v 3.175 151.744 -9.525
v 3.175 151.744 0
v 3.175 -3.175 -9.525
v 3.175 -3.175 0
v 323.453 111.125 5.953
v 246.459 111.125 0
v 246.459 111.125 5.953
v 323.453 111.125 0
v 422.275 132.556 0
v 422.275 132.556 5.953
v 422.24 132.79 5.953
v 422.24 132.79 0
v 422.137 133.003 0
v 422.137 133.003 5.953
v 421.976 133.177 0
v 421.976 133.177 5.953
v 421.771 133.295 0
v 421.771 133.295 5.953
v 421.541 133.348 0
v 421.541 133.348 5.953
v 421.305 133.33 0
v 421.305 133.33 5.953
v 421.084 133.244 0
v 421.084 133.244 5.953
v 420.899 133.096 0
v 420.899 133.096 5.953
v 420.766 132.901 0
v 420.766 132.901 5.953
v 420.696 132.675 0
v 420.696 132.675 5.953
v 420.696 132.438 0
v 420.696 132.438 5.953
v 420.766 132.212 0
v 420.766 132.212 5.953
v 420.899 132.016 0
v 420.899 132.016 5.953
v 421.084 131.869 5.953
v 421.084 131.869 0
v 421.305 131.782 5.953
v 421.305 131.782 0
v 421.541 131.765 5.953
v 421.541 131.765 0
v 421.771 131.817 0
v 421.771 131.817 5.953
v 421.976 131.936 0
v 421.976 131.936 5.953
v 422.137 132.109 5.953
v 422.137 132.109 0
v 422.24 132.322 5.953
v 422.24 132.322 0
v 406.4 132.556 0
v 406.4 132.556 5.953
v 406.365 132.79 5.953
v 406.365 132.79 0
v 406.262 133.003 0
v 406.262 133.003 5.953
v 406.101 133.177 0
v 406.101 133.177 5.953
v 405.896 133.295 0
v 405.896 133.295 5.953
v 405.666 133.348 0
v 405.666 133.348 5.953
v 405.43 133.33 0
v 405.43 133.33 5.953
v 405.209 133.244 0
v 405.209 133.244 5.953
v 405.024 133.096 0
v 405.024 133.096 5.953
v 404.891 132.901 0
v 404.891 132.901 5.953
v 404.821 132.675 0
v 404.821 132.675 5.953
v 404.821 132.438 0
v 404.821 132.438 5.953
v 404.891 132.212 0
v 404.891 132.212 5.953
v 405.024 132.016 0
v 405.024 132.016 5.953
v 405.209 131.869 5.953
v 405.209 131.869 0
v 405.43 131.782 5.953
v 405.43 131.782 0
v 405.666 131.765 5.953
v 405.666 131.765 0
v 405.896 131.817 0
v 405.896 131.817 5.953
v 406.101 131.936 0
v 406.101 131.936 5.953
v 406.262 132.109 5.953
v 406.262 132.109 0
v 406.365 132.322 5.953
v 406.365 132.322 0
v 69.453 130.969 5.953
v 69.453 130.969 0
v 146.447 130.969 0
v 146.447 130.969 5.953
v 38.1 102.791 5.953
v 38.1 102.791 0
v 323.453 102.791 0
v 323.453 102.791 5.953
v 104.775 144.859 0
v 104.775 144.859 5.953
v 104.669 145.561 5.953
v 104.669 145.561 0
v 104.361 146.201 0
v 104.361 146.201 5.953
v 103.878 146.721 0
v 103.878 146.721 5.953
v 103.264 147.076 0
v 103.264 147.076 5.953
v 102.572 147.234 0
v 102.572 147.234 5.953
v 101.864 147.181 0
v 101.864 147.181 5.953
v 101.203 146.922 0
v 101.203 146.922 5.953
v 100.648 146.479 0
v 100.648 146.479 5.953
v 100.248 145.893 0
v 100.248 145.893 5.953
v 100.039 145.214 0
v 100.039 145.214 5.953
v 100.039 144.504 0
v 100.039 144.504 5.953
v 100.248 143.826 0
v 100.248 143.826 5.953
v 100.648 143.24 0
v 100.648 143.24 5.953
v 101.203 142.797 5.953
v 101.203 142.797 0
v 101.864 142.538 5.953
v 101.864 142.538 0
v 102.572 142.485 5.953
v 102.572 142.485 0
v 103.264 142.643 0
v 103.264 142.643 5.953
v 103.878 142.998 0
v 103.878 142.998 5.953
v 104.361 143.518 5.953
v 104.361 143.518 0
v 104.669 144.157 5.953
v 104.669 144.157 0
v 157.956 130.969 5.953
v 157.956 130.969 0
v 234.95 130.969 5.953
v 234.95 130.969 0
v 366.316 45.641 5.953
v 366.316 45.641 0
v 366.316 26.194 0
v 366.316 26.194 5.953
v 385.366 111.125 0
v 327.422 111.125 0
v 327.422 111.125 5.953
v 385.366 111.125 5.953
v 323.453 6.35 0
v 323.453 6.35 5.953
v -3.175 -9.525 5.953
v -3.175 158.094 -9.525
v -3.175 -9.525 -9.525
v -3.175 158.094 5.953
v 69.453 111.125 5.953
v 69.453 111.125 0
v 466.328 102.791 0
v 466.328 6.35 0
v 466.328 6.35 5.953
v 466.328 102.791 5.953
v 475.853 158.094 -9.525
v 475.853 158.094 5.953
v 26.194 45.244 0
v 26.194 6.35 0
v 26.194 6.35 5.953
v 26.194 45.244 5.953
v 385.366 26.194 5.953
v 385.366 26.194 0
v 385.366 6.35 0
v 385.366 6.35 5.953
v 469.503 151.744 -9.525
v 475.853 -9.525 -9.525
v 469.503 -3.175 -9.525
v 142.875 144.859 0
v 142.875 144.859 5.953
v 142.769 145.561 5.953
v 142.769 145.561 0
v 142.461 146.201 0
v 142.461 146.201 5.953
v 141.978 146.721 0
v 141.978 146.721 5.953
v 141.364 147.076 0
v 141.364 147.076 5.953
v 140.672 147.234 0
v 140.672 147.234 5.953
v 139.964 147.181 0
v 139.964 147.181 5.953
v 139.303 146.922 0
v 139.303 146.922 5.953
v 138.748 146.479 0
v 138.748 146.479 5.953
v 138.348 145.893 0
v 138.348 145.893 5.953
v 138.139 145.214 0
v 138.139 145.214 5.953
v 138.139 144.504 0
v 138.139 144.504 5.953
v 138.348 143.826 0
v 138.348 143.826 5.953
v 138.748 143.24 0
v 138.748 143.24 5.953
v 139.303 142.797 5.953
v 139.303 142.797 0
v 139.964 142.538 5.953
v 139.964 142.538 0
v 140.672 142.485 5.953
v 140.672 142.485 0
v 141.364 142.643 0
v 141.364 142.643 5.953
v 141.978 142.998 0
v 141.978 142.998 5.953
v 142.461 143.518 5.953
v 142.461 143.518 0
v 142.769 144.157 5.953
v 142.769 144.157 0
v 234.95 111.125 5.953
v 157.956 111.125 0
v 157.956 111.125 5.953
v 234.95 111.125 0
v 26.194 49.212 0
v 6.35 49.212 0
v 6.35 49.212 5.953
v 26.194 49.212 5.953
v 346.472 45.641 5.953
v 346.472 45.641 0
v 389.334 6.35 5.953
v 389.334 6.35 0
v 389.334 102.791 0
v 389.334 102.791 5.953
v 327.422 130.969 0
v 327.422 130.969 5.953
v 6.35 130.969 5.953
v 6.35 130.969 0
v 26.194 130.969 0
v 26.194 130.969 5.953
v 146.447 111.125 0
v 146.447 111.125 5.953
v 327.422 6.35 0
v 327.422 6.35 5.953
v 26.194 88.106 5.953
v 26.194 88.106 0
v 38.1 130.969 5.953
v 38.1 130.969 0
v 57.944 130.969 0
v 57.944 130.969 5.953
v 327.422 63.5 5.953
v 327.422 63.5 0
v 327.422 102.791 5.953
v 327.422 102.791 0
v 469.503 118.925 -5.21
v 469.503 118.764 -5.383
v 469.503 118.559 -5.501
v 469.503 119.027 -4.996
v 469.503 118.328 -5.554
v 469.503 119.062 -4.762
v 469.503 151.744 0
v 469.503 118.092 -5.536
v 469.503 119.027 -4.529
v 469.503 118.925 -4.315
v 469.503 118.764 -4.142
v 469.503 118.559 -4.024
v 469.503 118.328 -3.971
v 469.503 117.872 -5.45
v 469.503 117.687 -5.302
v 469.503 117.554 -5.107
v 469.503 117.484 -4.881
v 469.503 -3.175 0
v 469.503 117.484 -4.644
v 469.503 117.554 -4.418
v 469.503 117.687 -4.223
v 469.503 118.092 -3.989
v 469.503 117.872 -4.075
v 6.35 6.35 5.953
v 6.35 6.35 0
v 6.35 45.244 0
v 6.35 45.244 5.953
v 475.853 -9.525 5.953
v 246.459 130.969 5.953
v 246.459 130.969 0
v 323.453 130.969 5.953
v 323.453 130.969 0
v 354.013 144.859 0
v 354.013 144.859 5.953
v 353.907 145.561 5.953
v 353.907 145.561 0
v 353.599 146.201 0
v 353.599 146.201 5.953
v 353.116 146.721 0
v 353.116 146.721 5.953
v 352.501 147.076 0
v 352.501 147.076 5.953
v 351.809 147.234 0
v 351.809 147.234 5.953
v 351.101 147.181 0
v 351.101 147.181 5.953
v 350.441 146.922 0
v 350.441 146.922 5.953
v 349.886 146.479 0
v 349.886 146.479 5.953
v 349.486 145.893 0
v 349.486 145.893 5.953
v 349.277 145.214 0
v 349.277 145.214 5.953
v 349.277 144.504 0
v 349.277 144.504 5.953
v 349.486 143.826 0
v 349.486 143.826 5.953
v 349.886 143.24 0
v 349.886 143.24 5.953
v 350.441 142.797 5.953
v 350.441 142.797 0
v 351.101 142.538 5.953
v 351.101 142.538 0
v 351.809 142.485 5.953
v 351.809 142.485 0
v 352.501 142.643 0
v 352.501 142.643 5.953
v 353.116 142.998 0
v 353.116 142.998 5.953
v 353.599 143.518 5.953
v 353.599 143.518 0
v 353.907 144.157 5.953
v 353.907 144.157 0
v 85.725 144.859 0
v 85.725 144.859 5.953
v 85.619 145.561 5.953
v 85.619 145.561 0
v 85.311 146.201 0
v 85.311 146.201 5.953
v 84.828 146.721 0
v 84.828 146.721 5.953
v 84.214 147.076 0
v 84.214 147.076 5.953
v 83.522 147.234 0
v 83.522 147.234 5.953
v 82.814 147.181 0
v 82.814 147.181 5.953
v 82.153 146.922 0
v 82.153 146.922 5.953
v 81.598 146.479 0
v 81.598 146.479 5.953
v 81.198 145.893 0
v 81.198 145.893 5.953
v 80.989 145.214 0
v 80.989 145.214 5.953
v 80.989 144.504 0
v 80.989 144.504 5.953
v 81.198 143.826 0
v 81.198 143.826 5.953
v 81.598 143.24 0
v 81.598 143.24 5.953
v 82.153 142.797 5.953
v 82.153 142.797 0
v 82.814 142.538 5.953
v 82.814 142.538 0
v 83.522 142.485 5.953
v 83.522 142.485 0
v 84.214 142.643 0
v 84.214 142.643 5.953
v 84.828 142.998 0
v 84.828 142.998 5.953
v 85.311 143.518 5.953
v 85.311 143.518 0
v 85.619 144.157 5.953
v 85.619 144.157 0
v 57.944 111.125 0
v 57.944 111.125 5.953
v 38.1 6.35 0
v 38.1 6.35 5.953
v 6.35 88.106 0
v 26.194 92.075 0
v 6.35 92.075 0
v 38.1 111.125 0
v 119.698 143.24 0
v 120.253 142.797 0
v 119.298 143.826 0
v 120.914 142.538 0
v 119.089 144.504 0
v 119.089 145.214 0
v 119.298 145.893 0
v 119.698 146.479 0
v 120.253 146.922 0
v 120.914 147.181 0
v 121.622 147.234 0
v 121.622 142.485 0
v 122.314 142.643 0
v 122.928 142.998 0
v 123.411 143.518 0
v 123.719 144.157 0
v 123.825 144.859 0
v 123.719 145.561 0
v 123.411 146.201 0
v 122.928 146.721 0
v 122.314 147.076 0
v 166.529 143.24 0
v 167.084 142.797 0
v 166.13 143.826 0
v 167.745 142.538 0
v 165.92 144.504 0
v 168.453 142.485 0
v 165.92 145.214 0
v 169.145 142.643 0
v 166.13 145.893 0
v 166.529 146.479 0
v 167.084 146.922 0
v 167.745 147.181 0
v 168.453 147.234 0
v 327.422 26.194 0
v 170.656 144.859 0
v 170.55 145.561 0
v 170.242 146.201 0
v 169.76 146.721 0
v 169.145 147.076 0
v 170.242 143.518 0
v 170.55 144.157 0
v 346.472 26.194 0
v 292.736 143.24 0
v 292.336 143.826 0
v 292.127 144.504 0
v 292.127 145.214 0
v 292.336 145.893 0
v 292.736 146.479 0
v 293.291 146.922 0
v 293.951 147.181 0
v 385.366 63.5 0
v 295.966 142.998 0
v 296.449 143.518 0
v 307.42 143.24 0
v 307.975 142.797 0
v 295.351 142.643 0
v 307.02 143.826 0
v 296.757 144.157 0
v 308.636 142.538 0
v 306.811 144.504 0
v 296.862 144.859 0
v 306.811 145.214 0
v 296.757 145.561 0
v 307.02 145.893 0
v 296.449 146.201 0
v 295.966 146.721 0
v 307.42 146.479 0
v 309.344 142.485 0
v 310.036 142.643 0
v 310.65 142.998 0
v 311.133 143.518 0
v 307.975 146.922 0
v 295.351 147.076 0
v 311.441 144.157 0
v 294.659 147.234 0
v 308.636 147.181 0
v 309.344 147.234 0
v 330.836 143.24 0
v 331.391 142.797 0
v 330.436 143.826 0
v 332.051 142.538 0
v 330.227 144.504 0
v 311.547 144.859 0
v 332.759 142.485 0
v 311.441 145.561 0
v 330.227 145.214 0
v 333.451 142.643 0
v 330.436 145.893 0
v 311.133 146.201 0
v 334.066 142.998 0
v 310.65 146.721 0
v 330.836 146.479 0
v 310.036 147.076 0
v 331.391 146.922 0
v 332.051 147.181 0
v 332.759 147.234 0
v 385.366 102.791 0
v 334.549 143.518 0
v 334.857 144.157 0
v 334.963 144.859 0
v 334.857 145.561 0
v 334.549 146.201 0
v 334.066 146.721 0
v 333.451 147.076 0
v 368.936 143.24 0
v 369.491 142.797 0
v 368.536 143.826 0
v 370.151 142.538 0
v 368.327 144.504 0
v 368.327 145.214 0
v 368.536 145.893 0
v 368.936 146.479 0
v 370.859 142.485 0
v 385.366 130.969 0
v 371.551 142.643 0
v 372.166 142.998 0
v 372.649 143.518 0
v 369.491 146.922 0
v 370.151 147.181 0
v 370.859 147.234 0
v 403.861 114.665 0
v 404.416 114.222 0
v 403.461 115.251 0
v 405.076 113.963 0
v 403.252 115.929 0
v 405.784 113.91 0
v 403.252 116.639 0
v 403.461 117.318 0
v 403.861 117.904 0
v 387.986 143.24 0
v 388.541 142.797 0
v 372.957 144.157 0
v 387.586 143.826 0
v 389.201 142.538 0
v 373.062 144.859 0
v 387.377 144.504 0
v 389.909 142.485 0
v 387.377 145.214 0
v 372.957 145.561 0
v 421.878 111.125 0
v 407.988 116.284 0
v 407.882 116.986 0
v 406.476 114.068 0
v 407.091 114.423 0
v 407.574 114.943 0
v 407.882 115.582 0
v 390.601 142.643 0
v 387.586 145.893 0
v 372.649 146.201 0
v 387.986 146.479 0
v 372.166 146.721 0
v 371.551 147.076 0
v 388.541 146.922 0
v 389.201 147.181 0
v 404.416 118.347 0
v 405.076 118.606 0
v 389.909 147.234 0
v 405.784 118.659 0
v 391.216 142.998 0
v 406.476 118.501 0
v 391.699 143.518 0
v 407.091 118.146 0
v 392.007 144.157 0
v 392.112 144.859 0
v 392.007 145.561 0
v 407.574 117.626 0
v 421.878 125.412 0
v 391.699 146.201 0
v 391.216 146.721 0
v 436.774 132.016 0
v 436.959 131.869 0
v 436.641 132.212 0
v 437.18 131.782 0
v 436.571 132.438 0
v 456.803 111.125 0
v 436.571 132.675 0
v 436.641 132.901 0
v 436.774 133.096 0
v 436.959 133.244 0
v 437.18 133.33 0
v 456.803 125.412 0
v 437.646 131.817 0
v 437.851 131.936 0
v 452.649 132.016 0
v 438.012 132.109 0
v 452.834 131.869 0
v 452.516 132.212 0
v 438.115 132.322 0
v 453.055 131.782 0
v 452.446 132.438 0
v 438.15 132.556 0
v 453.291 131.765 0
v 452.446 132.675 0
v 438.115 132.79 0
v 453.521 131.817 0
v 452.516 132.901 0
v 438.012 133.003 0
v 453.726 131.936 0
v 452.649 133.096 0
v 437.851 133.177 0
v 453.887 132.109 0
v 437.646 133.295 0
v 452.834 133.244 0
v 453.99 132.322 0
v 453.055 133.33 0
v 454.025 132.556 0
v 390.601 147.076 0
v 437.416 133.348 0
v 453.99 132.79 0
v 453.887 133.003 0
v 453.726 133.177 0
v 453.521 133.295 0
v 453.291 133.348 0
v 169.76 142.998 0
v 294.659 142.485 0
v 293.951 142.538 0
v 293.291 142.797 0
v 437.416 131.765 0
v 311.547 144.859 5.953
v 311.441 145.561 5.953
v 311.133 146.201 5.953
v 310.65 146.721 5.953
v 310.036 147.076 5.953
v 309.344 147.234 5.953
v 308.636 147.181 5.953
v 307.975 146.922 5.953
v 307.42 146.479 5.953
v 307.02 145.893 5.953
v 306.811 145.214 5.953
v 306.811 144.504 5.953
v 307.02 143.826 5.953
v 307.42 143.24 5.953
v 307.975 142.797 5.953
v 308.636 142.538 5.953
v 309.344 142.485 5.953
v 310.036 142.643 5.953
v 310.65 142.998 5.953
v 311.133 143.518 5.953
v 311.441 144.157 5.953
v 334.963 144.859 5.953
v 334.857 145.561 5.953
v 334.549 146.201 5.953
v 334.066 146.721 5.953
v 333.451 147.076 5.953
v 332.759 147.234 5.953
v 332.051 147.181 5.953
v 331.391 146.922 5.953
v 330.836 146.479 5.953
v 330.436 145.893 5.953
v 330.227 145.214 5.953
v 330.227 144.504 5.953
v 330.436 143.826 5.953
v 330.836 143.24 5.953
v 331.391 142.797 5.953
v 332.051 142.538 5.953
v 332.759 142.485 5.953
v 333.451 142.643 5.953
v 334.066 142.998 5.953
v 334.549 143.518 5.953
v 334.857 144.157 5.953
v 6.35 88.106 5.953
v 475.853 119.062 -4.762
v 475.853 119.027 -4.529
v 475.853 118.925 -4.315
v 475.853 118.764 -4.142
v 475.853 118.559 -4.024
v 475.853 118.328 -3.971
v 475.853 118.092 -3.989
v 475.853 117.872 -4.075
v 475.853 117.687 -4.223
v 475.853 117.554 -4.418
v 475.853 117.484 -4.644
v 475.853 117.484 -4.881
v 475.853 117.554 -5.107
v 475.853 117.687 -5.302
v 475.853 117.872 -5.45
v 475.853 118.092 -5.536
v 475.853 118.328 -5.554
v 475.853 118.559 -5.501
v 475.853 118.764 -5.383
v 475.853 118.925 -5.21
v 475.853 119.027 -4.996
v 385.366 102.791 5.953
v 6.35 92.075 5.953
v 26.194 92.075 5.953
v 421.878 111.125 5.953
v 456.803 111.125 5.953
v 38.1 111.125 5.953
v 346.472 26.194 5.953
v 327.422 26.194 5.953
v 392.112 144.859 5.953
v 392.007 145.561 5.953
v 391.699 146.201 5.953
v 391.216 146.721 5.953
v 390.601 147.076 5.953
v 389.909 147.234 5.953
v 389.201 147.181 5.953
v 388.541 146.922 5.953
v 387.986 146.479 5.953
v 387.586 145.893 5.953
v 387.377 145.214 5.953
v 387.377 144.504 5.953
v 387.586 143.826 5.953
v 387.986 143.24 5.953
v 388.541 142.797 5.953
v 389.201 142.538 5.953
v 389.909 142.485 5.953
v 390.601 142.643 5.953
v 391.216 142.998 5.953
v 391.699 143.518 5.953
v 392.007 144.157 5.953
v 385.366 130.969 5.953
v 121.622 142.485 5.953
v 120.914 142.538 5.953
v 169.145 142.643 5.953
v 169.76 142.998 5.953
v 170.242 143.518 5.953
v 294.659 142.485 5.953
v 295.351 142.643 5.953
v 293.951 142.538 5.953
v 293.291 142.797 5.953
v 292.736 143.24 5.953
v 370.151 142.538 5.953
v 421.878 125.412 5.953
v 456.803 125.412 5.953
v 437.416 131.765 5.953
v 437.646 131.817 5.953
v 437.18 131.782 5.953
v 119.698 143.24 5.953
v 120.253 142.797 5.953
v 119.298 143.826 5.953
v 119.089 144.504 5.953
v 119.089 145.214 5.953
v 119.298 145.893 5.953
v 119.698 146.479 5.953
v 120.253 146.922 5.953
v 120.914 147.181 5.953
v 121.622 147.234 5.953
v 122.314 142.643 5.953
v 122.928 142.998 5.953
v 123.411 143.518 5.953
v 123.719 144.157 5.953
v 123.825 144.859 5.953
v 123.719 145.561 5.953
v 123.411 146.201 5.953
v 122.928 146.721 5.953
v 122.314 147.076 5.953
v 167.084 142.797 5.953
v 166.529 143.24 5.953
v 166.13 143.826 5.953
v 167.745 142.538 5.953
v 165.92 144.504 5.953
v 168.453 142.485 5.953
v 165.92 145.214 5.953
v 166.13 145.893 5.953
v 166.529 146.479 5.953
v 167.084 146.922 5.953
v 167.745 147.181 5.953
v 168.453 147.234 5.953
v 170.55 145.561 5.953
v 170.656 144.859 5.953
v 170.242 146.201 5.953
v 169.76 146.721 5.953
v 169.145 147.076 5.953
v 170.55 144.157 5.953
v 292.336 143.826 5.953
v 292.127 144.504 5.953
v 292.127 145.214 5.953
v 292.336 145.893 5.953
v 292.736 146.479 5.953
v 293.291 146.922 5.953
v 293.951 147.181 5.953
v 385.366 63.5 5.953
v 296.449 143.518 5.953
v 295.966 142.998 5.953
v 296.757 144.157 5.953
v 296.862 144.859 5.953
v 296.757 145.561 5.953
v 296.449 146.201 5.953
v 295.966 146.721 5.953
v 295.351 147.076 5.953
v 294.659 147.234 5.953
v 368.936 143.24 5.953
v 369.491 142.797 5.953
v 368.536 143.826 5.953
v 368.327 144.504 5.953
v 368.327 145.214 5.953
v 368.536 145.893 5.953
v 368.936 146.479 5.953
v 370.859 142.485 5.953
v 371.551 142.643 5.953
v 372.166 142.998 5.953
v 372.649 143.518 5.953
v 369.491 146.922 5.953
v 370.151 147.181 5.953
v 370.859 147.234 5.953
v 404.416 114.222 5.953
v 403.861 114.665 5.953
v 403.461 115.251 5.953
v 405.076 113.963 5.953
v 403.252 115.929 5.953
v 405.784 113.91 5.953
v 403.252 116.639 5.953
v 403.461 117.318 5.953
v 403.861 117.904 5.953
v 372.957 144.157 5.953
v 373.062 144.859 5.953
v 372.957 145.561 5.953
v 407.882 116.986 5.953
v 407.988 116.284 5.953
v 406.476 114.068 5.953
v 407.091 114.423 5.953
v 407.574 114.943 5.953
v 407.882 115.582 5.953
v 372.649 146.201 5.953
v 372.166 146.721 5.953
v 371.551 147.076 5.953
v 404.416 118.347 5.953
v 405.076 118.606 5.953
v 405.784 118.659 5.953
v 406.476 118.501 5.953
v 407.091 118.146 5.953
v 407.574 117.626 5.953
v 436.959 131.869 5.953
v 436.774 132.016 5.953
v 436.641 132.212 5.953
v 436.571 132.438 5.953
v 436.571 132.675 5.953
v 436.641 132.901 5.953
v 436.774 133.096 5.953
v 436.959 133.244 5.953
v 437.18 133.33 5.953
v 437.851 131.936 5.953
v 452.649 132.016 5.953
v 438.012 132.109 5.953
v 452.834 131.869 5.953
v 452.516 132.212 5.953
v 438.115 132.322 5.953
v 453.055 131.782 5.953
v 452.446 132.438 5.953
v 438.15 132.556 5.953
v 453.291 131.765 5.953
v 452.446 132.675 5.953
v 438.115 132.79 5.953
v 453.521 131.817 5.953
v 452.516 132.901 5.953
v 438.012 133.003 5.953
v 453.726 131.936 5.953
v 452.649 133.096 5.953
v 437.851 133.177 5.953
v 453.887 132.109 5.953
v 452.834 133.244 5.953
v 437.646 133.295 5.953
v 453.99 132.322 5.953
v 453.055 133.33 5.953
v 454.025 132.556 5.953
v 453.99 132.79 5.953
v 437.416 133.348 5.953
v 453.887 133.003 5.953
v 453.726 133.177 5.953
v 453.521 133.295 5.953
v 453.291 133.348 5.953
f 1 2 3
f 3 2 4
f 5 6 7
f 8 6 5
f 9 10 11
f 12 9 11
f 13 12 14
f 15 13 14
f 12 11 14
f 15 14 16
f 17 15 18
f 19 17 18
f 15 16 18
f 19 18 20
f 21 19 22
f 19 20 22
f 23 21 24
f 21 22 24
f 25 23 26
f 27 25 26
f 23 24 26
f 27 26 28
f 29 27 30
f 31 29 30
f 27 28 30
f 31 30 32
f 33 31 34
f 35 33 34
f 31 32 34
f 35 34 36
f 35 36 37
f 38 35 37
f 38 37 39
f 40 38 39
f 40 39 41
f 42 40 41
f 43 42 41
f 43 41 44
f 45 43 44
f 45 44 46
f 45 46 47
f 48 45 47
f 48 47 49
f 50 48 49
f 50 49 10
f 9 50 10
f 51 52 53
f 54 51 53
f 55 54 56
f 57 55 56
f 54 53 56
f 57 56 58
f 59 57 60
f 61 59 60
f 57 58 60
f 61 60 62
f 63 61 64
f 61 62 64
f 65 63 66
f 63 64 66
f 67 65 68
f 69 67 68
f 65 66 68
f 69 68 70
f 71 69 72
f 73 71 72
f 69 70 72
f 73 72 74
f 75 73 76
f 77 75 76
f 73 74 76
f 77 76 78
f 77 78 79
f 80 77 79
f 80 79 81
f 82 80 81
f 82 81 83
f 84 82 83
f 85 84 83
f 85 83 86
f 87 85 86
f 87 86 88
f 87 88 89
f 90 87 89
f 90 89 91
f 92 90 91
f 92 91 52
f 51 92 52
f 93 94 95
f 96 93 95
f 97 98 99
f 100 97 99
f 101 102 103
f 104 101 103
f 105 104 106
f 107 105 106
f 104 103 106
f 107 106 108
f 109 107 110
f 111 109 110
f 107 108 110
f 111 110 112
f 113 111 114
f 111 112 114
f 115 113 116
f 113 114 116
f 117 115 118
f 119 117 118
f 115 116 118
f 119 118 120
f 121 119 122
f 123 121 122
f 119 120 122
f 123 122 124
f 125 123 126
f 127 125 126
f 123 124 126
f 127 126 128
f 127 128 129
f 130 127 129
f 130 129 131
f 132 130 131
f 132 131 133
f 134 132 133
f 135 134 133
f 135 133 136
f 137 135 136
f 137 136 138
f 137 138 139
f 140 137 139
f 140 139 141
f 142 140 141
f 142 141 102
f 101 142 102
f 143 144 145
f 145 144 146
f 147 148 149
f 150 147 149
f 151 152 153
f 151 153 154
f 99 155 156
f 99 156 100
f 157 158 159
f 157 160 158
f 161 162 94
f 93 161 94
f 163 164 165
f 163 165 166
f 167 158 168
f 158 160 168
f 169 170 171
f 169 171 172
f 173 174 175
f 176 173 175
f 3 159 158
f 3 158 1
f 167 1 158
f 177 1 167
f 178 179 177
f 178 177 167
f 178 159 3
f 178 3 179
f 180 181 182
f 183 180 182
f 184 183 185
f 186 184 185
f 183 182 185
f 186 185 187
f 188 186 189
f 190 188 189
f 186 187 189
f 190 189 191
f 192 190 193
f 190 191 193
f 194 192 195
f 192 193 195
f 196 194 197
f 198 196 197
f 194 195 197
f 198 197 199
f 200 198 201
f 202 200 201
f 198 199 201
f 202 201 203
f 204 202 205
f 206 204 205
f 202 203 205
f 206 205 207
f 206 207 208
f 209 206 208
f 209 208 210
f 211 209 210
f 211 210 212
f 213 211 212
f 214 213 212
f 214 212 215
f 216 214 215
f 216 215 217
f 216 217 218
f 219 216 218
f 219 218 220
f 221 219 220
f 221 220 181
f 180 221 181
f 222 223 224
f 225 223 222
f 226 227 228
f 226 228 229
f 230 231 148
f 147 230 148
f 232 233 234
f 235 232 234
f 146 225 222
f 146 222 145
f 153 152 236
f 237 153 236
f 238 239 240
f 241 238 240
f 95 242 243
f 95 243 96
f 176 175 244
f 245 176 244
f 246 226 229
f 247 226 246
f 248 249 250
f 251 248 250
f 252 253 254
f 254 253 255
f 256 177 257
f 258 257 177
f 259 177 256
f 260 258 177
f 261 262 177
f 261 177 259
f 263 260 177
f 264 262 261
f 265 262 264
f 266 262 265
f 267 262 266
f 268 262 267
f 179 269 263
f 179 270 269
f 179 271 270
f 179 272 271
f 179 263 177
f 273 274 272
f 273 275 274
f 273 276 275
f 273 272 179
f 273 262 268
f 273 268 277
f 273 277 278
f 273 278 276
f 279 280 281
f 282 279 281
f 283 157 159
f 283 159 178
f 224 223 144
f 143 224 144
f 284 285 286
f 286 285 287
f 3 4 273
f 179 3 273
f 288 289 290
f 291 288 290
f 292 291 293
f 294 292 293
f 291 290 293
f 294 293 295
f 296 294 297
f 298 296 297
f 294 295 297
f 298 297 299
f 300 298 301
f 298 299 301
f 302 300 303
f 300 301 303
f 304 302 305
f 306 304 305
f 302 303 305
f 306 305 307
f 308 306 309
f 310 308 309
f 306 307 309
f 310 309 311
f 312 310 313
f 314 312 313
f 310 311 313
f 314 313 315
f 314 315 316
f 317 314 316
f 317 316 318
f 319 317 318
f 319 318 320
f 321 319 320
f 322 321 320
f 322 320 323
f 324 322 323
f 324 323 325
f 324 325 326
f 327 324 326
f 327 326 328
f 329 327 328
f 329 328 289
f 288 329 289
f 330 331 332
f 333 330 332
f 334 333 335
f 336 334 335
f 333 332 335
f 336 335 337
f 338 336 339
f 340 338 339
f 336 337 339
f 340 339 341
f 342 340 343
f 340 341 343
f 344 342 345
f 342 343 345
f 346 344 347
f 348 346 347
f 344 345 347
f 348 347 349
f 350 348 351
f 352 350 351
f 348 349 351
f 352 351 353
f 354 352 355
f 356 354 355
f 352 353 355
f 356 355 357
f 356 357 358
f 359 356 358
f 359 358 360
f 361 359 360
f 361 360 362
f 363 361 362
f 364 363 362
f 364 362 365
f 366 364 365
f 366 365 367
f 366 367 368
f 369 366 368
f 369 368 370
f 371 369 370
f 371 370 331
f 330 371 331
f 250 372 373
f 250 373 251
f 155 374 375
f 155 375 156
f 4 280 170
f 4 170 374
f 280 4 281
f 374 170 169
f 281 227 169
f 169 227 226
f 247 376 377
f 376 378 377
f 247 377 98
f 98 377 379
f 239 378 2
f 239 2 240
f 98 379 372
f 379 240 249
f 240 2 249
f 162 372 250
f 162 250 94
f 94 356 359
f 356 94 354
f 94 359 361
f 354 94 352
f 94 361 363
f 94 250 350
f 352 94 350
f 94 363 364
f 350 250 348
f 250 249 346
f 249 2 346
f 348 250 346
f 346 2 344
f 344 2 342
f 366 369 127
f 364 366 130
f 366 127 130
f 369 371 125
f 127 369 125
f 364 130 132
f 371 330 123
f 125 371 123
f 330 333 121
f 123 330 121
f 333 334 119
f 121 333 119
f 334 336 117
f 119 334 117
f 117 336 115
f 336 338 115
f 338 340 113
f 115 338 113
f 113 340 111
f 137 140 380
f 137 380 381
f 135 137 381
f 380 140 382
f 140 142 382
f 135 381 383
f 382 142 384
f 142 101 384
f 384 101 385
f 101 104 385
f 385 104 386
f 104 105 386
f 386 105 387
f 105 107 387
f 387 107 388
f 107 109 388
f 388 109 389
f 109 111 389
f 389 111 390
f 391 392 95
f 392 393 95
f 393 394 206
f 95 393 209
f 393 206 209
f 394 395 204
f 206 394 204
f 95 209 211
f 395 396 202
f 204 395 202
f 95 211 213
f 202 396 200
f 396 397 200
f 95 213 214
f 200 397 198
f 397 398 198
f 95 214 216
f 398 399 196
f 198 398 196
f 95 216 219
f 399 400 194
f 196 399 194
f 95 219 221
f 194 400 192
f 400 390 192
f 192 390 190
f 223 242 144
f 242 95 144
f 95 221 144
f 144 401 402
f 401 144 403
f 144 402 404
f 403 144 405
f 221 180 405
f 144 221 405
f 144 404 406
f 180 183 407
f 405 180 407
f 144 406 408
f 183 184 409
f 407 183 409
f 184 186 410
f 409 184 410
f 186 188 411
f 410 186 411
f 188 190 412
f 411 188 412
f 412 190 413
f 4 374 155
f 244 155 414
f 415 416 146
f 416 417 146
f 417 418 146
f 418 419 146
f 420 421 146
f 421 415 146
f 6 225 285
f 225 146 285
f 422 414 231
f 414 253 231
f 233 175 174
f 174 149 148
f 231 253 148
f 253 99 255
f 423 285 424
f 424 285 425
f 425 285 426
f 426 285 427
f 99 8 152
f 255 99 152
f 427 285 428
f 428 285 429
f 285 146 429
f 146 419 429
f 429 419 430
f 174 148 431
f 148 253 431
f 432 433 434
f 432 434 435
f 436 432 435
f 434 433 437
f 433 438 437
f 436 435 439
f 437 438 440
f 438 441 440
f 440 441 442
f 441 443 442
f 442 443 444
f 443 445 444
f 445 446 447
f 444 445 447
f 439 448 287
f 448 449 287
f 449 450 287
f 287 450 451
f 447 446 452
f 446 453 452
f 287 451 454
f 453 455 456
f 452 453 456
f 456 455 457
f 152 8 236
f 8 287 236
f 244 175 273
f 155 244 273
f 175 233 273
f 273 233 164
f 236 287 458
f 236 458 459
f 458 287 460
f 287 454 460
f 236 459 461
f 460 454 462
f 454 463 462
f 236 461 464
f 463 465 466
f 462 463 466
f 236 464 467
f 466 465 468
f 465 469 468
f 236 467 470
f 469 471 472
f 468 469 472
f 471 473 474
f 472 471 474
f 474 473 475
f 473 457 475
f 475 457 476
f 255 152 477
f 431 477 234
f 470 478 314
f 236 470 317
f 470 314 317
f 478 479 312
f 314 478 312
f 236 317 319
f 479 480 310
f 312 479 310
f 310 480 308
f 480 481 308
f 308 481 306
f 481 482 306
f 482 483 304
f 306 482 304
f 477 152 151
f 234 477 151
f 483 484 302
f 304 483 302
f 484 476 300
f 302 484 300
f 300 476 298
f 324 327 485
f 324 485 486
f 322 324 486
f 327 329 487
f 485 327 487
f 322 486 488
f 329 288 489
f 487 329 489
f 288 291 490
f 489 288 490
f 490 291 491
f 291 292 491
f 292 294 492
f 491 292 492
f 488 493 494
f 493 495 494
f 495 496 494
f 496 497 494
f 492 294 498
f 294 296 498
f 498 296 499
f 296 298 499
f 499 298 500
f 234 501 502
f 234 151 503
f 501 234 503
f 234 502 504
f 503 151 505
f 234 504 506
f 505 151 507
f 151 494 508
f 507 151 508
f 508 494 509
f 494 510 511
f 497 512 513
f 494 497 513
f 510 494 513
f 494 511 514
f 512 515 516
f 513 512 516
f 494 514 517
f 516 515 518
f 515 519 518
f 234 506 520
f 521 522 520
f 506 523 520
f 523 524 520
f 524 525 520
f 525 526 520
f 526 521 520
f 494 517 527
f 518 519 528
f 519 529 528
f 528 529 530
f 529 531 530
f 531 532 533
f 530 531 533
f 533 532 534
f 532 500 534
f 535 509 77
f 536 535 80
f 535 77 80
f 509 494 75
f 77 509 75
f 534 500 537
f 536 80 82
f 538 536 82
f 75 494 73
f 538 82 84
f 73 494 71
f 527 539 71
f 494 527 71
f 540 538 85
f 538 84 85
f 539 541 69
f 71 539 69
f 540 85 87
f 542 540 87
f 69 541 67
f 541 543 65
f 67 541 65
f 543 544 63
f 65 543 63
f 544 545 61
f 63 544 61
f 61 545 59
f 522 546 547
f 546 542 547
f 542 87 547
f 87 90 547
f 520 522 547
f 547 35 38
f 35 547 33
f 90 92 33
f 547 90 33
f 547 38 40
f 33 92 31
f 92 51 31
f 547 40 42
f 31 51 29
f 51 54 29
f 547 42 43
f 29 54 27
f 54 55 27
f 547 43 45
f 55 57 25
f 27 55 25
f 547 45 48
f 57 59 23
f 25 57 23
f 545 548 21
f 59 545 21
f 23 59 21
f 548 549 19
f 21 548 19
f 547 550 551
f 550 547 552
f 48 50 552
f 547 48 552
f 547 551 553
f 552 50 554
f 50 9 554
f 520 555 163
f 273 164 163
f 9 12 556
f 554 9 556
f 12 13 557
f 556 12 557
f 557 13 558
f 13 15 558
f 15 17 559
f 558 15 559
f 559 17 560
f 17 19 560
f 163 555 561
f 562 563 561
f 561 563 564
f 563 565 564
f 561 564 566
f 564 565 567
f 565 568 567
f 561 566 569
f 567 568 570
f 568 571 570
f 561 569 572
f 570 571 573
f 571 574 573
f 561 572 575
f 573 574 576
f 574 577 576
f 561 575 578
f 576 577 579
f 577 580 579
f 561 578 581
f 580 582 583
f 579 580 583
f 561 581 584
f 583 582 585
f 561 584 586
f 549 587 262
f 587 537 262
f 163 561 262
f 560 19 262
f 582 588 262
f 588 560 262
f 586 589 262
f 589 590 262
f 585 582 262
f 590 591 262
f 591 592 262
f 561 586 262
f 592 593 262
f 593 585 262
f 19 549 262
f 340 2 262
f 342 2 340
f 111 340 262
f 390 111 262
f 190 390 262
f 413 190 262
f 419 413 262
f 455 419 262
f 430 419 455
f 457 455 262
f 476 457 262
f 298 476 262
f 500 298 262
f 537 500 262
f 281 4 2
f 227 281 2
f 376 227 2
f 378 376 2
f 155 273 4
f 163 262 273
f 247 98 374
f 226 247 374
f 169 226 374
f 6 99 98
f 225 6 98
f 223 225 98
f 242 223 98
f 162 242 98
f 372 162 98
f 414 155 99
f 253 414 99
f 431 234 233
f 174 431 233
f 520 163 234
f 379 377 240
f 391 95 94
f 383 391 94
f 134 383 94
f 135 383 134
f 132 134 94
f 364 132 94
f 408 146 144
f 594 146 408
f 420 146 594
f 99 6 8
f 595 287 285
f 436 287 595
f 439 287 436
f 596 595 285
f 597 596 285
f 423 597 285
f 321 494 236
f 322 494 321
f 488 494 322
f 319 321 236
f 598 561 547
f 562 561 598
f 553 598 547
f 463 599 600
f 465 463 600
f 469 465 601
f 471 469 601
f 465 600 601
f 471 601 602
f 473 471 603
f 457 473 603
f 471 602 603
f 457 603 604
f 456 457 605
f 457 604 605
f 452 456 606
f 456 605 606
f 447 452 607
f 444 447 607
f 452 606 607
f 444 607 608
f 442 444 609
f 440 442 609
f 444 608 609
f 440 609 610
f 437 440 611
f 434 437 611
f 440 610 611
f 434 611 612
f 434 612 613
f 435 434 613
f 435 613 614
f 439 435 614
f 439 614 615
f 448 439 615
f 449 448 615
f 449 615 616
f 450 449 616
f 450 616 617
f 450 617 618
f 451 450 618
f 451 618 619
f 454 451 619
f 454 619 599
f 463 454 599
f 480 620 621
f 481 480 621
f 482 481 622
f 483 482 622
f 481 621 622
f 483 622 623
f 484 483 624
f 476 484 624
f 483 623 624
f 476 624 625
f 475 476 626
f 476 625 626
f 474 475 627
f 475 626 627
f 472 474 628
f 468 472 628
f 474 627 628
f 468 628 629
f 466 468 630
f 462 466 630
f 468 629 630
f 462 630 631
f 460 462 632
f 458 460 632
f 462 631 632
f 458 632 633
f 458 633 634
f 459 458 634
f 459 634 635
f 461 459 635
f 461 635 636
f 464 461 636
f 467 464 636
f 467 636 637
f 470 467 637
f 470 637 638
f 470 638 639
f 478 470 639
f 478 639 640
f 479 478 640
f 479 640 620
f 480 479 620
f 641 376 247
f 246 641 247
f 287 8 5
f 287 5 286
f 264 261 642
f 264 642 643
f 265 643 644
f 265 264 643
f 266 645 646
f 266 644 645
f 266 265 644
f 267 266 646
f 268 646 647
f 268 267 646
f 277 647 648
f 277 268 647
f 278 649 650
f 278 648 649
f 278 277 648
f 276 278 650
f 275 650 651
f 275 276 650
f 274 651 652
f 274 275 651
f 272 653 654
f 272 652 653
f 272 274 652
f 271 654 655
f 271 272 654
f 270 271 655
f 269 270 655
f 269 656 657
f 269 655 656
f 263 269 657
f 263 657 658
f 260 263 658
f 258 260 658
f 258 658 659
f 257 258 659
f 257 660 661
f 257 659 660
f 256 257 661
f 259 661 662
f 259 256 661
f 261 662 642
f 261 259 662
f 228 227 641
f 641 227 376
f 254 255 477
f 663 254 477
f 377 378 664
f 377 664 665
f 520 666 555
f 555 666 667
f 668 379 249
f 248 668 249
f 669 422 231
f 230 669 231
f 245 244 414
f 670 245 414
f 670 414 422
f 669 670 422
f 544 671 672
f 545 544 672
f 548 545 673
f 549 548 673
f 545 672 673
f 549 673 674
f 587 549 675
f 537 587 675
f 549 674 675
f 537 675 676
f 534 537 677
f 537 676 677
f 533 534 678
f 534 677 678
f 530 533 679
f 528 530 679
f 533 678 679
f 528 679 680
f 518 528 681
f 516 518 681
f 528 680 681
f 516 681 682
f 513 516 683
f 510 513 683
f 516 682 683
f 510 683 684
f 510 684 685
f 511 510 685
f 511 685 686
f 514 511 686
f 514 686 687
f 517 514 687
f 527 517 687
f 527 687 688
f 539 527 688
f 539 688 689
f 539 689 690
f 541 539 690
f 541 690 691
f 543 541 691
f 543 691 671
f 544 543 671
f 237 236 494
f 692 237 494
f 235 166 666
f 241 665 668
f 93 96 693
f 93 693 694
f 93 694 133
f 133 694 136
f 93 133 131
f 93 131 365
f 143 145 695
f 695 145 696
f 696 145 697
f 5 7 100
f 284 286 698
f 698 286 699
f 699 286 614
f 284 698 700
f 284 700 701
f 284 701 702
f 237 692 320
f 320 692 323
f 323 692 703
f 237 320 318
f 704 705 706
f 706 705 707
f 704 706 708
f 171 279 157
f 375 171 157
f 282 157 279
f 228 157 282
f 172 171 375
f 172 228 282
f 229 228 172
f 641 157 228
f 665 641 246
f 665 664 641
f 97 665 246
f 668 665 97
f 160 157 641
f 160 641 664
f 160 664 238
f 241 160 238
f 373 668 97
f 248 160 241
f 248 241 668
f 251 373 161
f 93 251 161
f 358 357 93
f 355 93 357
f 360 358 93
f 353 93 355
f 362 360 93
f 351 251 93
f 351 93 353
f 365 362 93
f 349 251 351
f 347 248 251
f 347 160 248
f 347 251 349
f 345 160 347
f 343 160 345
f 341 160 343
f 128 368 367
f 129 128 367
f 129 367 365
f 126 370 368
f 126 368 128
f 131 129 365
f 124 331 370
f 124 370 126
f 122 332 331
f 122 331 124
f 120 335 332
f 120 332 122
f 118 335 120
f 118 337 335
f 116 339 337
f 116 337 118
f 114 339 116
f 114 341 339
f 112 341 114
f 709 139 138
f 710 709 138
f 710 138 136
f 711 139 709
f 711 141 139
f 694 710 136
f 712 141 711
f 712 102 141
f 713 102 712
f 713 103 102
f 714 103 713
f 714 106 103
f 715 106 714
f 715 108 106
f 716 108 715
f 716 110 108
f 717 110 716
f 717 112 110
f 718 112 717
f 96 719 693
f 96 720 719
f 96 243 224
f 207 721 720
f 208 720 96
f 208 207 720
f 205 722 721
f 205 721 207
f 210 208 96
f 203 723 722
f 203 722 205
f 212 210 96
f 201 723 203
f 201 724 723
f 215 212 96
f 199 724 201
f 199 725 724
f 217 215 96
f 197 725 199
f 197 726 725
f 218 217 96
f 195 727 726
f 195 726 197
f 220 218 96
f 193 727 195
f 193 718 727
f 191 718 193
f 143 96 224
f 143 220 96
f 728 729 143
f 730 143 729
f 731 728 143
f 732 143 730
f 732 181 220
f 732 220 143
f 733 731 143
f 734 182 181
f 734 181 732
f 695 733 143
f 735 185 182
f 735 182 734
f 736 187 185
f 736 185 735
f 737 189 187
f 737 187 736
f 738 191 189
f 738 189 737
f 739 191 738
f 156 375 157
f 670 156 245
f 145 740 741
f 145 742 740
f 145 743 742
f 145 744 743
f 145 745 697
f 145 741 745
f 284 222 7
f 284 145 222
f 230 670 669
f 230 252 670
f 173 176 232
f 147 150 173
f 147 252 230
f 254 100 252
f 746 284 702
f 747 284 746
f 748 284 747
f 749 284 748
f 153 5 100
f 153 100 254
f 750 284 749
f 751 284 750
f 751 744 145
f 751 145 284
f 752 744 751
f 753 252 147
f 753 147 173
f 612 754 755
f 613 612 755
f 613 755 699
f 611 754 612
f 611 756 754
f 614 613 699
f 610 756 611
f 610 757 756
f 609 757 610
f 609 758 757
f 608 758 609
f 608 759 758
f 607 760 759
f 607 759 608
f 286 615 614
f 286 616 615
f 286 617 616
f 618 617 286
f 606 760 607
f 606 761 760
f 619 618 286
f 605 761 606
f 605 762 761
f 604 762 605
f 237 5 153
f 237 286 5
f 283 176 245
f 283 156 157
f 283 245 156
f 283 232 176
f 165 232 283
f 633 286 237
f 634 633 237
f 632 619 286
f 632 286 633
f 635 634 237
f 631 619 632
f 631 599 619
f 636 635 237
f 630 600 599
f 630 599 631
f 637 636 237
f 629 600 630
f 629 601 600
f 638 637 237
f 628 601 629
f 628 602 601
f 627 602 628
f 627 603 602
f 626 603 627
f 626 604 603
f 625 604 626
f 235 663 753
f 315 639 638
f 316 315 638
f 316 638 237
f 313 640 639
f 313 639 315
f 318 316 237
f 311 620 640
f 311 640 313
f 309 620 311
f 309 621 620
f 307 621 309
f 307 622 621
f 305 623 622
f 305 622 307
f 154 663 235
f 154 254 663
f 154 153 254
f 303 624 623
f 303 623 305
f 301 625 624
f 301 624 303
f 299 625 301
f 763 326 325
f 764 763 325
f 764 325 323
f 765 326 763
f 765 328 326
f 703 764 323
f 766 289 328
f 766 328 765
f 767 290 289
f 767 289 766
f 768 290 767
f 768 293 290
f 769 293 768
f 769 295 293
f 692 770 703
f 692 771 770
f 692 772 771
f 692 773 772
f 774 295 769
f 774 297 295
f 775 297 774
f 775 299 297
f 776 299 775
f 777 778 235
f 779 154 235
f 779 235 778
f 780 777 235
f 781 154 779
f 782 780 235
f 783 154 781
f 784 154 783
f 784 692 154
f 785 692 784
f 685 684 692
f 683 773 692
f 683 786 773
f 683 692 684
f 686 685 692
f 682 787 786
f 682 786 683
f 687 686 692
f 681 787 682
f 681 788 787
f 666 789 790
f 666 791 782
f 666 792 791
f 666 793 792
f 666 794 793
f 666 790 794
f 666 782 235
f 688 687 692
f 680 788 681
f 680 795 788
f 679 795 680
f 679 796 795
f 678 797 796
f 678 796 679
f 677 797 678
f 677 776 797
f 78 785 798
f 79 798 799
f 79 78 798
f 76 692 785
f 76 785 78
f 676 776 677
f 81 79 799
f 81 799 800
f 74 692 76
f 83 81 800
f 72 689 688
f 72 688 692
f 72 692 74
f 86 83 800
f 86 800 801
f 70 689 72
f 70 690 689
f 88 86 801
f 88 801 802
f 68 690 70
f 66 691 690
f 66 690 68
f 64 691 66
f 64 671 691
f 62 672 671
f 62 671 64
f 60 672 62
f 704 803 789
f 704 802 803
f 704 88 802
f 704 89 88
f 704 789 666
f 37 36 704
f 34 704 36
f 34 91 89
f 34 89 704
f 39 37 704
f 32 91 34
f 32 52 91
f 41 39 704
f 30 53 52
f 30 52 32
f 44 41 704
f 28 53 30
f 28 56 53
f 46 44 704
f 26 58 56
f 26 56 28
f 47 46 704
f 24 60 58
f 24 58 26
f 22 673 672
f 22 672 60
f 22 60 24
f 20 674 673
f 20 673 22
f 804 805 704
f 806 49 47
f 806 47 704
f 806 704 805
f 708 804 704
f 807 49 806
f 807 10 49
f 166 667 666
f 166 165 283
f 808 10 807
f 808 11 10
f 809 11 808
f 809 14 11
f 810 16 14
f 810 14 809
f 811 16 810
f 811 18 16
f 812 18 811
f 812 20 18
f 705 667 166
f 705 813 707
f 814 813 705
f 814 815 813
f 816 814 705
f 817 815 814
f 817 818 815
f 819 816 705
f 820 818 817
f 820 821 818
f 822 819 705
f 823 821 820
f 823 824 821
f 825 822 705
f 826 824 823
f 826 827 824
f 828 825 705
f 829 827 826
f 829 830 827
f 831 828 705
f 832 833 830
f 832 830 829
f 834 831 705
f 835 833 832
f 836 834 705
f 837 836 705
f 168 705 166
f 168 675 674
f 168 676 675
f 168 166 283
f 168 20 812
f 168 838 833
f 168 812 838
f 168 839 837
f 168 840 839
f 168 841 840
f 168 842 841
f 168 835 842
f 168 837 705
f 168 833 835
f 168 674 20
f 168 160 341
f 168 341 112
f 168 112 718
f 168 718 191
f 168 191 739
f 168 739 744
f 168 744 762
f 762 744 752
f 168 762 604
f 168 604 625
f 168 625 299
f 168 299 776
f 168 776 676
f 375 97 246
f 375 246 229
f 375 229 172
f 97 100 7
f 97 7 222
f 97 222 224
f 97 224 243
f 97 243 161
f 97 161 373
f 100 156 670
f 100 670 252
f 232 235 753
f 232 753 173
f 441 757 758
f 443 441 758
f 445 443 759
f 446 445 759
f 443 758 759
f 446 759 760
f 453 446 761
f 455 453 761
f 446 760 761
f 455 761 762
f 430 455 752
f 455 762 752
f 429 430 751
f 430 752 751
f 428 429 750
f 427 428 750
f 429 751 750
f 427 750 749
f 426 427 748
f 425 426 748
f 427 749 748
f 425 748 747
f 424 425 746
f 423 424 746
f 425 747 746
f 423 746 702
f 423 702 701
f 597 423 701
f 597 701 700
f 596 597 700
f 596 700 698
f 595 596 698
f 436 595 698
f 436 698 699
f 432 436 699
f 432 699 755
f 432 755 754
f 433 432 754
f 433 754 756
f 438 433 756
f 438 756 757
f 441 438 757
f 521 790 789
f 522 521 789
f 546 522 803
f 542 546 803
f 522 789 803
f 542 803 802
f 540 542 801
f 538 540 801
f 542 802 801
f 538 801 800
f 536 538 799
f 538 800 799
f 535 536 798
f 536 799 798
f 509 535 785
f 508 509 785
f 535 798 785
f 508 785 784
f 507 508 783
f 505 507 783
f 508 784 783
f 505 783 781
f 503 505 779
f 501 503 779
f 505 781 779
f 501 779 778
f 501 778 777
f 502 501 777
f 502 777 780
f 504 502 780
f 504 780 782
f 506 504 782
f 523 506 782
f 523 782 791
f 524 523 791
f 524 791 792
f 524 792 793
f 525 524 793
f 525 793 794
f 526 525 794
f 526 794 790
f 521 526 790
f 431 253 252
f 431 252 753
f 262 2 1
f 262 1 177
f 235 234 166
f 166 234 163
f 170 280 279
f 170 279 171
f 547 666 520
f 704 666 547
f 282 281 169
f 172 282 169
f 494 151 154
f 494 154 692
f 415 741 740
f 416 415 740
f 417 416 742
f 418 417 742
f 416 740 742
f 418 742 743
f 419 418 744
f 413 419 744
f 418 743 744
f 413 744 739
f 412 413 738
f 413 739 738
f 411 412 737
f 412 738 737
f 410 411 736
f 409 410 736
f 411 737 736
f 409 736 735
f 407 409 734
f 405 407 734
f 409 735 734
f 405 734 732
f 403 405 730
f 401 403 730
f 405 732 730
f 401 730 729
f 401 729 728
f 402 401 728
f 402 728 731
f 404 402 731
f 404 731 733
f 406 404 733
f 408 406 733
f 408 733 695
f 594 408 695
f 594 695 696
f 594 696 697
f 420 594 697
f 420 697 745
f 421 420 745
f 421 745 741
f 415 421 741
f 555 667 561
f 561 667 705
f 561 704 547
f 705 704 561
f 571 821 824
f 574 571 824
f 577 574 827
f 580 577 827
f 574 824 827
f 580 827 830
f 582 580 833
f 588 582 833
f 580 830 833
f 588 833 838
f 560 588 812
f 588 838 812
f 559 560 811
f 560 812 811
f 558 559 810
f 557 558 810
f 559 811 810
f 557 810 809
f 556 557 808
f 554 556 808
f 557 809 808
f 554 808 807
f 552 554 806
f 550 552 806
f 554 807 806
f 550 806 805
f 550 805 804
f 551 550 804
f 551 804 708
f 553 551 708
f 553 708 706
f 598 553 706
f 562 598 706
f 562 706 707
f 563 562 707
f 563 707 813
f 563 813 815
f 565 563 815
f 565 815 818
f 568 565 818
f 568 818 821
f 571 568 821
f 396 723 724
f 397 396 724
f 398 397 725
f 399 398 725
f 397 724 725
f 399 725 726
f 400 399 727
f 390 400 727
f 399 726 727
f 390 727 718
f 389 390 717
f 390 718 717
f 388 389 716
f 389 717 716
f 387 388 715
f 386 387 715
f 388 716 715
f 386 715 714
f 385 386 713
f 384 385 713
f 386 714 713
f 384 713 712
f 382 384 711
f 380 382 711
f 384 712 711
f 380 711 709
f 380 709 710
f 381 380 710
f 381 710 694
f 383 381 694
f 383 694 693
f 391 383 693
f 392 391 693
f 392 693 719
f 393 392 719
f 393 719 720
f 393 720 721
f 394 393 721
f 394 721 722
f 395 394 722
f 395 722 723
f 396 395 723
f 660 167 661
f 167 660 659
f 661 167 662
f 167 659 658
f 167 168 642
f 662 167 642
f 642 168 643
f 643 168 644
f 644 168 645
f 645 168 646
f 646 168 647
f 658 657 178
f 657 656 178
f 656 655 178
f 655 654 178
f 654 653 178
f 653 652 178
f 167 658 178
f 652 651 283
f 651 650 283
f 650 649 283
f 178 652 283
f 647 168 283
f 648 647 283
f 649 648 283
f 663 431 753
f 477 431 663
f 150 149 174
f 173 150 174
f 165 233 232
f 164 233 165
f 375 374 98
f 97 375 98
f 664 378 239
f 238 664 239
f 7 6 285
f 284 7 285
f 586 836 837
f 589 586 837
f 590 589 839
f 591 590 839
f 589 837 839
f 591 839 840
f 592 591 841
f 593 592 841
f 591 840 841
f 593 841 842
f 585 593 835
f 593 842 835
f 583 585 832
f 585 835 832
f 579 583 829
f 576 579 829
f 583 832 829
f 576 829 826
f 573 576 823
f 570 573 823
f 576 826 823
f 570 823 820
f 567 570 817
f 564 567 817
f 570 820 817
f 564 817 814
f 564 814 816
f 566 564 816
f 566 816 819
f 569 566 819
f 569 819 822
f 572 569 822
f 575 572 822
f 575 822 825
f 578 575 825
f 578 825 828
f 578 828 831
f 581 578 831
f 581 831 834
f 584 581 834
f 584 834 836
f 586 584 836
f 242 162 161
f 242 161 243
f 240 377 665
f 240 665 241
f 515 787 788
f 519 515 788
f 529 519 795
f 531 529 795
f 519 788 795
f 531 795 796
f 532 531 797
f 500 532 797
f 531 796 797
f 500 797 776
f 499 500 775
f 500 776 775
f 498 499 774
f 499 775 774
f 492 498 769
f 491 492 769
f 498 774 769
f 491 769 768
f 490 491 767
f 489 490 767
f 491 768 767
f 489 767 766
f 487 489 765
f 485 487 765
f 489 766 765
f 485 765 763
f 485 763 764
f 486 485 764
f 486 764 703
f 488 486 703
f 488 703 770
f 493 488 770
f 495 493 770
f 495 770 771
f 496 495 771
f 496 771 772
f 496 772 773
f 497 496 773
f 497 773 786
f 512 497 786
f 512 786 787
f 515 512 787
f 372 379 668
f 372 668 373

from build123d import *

# Parameters (mm, degrees)
F0_W      = 479.028125
F0_H      = 167.619304
F0_W_2    = 19.84375
F0_H_2    = 38.89375
F0_W_3    = 285.353125
F0_H_3    = 96.440625
F0_W_4    = 76.99375
F0_H_4    = 19.84375
F0_W_5    = 57.94375
F0_H_5    = 39.290625
F1_DEPTH  = 5.953125
F2_R      = 2.38125
F2_R_2    = 0.79375
F3_DEPTH  = 5.954125
F4_W      = 479.028125
F4_H      = 167.619304
F4_W_2    = 466.328125
F4_H_2    = 154.919304
F5_DEPTH  = 9.525
F6_W      = 34.925
F6_H      = 14.2875
F7_DEPTH  = 15.479125
F9_R      = 0.79375
F10_DEPTH = 42.530125


with BuildPart() as f1:
    # F0 (on Top) → F1 (new body)
    with BuildSketch(Plane.XY):
        with Locations((236.339062, 74.284652)):
            Rectangle(F0_W, F0_H)
        with Locations((16.271875, 25.796875)):
            Rectangle(F0_W_2, F0_H_2, mode=Mode.SUBTRACT)
        with Locations((16.271875, 68.659375)):
            Rectangle(F0_W_2, F0_H_2, mode=Mode.SUBTRACT)
        with Locations((180.776563, 54.570312)):
            Rectangle(F0_W_3, F0_H_3, mode=Mode.SUBTRACT)
        Polygon((385.365625, 6.35), (327.421875, 6.35), (327.421875, 26.19375), (346.471875, 26.19375), (346.471875, 45.640625), (366.315625, 45.640625), (366.315625, 26.19375), (385.365625, 26.19375), align=None, mode=Mode.SUBTRACT)
        with Locations((427.83125, 54.570312)):
            Rectangle(F0_W_4, F0_H_3, mode=Mode.SUBTRACT)
        with Locations((16.271875, 111.521875)):
            Rectangle(F0_W_2, F0_H_2, mode=Mode.SUBTRACT)
        with Locations((48.021875, 121.046875)):
            Rectangle(F0_W_2, F0_H_4, mode=Mode.SUBTRACT)
        with Locations((107.95, 121.046875)):
            Rectangle(F0_W_4, F0_H_4, mode=Mode.SUBTRACT)
        with Locations((196.453125, 121.046875)):
            Rectangle(F0_W_4, F0_H_4, mode=Mode.SUBTRACT)
        with Locations((356.39375, 83.145312)):
            Rectangle(F0_W_5, F0_H_5, mode=Mode.SUBTRACT)
        with Locations((284.95625, 121.046875)):
            Rectangle(F0_W_4, F0_H_4, mode=Mode.SUBTRACT)
        with Locations((356.39375, 121.046875)):
            Rectangle(F0_W_5, F0_H_4, mode=Mode.SUBTRACT)
    extrude(amount=F1_DEPTH)

    # F2 (on face) → F3 (cut, through all)
    with BuildSketch(Plane.XY.offset(5.953125)):
        with Locations((83.34375, 144.859375)):
            Circle(F2_R)
        with Locations((102.39375, 144.859375)):
            Circle(F2_R)
        with Locations((121.44375, 144.859375)):
            Circle(F2_R)
        with Locations((140.49375, 144.859375)):
            Circle(F2_R)
        with Locations((168.275, 144.859375)):
            Circle(F2_R)
        with Locations((294.48125, 144.859375)):
            Circle(F2_R)
        with Locations((309.165625, 144.859375)):
            Circle(F2_R)
        with Locations((332.58125, 144.859375)):
            Circle(F2_R)
        with Locations((351.63125, 144.859375)):
            Circle(F2_R)
        with Locations((370.68125, 144.859375)):
            Circle(F2_R)
        with Locations((389.73125, 144.859375)):
            Circle(F2_R)
        with Locations((405.60625, 116.284375)):
            Circle(F2_R)
        with Locations((405.60625, 132.55625)):
            Circle(F2_R_2)
        with Locations((421.48125, 132.55625)):
            Circle(F2_R_2)
        with Locations((437.35625, 132.55625)):
            Circle(F2_R_2)
        with Locations((453.23125, 132.55625)):
            Circle(F2_R_2)
    extrude(amount=-F3_DEPTH, mode=Mode.SUBTRACT)

    # F4 (on face) → F5 (join)
    with BuildSketch(Plane(origin=(0, 0, 0), x_dir=(1, 0, 0), z_dir=(0, 0, -1))):
        with Locations((236.339062, -74.284652)):
            Rectangle(F4_W, F4_H)
        with Locations((236.339062, -74.284652)):
            Rectangle(F4_W_2, F4_H_2, mode=Mode.SUBTRACT)
    extrude(amount=F5_DEPTH)

    # F6 (on face) → F7 (cut, through all)
    with BuildSketch(Plane.XY.offset(5.953125)):
        with Locations((439.340625, 118.26875)):
            Rectangle(F6_W, F6_H)
    extrude(amount=-F7_DEPTH, mode=Mode.SUBTRACT)

    # F9 (on offset) → F10 (cut, through all)
    with BuildSketch(Plane.YZ.offset(433.324)):
        with Locations((118.26875, -4.7625)):
            Circle(F9_R)
    extrude(amount=F10_DEPTH, mode=Mode.SUBTRACT)


solid = f1.part
